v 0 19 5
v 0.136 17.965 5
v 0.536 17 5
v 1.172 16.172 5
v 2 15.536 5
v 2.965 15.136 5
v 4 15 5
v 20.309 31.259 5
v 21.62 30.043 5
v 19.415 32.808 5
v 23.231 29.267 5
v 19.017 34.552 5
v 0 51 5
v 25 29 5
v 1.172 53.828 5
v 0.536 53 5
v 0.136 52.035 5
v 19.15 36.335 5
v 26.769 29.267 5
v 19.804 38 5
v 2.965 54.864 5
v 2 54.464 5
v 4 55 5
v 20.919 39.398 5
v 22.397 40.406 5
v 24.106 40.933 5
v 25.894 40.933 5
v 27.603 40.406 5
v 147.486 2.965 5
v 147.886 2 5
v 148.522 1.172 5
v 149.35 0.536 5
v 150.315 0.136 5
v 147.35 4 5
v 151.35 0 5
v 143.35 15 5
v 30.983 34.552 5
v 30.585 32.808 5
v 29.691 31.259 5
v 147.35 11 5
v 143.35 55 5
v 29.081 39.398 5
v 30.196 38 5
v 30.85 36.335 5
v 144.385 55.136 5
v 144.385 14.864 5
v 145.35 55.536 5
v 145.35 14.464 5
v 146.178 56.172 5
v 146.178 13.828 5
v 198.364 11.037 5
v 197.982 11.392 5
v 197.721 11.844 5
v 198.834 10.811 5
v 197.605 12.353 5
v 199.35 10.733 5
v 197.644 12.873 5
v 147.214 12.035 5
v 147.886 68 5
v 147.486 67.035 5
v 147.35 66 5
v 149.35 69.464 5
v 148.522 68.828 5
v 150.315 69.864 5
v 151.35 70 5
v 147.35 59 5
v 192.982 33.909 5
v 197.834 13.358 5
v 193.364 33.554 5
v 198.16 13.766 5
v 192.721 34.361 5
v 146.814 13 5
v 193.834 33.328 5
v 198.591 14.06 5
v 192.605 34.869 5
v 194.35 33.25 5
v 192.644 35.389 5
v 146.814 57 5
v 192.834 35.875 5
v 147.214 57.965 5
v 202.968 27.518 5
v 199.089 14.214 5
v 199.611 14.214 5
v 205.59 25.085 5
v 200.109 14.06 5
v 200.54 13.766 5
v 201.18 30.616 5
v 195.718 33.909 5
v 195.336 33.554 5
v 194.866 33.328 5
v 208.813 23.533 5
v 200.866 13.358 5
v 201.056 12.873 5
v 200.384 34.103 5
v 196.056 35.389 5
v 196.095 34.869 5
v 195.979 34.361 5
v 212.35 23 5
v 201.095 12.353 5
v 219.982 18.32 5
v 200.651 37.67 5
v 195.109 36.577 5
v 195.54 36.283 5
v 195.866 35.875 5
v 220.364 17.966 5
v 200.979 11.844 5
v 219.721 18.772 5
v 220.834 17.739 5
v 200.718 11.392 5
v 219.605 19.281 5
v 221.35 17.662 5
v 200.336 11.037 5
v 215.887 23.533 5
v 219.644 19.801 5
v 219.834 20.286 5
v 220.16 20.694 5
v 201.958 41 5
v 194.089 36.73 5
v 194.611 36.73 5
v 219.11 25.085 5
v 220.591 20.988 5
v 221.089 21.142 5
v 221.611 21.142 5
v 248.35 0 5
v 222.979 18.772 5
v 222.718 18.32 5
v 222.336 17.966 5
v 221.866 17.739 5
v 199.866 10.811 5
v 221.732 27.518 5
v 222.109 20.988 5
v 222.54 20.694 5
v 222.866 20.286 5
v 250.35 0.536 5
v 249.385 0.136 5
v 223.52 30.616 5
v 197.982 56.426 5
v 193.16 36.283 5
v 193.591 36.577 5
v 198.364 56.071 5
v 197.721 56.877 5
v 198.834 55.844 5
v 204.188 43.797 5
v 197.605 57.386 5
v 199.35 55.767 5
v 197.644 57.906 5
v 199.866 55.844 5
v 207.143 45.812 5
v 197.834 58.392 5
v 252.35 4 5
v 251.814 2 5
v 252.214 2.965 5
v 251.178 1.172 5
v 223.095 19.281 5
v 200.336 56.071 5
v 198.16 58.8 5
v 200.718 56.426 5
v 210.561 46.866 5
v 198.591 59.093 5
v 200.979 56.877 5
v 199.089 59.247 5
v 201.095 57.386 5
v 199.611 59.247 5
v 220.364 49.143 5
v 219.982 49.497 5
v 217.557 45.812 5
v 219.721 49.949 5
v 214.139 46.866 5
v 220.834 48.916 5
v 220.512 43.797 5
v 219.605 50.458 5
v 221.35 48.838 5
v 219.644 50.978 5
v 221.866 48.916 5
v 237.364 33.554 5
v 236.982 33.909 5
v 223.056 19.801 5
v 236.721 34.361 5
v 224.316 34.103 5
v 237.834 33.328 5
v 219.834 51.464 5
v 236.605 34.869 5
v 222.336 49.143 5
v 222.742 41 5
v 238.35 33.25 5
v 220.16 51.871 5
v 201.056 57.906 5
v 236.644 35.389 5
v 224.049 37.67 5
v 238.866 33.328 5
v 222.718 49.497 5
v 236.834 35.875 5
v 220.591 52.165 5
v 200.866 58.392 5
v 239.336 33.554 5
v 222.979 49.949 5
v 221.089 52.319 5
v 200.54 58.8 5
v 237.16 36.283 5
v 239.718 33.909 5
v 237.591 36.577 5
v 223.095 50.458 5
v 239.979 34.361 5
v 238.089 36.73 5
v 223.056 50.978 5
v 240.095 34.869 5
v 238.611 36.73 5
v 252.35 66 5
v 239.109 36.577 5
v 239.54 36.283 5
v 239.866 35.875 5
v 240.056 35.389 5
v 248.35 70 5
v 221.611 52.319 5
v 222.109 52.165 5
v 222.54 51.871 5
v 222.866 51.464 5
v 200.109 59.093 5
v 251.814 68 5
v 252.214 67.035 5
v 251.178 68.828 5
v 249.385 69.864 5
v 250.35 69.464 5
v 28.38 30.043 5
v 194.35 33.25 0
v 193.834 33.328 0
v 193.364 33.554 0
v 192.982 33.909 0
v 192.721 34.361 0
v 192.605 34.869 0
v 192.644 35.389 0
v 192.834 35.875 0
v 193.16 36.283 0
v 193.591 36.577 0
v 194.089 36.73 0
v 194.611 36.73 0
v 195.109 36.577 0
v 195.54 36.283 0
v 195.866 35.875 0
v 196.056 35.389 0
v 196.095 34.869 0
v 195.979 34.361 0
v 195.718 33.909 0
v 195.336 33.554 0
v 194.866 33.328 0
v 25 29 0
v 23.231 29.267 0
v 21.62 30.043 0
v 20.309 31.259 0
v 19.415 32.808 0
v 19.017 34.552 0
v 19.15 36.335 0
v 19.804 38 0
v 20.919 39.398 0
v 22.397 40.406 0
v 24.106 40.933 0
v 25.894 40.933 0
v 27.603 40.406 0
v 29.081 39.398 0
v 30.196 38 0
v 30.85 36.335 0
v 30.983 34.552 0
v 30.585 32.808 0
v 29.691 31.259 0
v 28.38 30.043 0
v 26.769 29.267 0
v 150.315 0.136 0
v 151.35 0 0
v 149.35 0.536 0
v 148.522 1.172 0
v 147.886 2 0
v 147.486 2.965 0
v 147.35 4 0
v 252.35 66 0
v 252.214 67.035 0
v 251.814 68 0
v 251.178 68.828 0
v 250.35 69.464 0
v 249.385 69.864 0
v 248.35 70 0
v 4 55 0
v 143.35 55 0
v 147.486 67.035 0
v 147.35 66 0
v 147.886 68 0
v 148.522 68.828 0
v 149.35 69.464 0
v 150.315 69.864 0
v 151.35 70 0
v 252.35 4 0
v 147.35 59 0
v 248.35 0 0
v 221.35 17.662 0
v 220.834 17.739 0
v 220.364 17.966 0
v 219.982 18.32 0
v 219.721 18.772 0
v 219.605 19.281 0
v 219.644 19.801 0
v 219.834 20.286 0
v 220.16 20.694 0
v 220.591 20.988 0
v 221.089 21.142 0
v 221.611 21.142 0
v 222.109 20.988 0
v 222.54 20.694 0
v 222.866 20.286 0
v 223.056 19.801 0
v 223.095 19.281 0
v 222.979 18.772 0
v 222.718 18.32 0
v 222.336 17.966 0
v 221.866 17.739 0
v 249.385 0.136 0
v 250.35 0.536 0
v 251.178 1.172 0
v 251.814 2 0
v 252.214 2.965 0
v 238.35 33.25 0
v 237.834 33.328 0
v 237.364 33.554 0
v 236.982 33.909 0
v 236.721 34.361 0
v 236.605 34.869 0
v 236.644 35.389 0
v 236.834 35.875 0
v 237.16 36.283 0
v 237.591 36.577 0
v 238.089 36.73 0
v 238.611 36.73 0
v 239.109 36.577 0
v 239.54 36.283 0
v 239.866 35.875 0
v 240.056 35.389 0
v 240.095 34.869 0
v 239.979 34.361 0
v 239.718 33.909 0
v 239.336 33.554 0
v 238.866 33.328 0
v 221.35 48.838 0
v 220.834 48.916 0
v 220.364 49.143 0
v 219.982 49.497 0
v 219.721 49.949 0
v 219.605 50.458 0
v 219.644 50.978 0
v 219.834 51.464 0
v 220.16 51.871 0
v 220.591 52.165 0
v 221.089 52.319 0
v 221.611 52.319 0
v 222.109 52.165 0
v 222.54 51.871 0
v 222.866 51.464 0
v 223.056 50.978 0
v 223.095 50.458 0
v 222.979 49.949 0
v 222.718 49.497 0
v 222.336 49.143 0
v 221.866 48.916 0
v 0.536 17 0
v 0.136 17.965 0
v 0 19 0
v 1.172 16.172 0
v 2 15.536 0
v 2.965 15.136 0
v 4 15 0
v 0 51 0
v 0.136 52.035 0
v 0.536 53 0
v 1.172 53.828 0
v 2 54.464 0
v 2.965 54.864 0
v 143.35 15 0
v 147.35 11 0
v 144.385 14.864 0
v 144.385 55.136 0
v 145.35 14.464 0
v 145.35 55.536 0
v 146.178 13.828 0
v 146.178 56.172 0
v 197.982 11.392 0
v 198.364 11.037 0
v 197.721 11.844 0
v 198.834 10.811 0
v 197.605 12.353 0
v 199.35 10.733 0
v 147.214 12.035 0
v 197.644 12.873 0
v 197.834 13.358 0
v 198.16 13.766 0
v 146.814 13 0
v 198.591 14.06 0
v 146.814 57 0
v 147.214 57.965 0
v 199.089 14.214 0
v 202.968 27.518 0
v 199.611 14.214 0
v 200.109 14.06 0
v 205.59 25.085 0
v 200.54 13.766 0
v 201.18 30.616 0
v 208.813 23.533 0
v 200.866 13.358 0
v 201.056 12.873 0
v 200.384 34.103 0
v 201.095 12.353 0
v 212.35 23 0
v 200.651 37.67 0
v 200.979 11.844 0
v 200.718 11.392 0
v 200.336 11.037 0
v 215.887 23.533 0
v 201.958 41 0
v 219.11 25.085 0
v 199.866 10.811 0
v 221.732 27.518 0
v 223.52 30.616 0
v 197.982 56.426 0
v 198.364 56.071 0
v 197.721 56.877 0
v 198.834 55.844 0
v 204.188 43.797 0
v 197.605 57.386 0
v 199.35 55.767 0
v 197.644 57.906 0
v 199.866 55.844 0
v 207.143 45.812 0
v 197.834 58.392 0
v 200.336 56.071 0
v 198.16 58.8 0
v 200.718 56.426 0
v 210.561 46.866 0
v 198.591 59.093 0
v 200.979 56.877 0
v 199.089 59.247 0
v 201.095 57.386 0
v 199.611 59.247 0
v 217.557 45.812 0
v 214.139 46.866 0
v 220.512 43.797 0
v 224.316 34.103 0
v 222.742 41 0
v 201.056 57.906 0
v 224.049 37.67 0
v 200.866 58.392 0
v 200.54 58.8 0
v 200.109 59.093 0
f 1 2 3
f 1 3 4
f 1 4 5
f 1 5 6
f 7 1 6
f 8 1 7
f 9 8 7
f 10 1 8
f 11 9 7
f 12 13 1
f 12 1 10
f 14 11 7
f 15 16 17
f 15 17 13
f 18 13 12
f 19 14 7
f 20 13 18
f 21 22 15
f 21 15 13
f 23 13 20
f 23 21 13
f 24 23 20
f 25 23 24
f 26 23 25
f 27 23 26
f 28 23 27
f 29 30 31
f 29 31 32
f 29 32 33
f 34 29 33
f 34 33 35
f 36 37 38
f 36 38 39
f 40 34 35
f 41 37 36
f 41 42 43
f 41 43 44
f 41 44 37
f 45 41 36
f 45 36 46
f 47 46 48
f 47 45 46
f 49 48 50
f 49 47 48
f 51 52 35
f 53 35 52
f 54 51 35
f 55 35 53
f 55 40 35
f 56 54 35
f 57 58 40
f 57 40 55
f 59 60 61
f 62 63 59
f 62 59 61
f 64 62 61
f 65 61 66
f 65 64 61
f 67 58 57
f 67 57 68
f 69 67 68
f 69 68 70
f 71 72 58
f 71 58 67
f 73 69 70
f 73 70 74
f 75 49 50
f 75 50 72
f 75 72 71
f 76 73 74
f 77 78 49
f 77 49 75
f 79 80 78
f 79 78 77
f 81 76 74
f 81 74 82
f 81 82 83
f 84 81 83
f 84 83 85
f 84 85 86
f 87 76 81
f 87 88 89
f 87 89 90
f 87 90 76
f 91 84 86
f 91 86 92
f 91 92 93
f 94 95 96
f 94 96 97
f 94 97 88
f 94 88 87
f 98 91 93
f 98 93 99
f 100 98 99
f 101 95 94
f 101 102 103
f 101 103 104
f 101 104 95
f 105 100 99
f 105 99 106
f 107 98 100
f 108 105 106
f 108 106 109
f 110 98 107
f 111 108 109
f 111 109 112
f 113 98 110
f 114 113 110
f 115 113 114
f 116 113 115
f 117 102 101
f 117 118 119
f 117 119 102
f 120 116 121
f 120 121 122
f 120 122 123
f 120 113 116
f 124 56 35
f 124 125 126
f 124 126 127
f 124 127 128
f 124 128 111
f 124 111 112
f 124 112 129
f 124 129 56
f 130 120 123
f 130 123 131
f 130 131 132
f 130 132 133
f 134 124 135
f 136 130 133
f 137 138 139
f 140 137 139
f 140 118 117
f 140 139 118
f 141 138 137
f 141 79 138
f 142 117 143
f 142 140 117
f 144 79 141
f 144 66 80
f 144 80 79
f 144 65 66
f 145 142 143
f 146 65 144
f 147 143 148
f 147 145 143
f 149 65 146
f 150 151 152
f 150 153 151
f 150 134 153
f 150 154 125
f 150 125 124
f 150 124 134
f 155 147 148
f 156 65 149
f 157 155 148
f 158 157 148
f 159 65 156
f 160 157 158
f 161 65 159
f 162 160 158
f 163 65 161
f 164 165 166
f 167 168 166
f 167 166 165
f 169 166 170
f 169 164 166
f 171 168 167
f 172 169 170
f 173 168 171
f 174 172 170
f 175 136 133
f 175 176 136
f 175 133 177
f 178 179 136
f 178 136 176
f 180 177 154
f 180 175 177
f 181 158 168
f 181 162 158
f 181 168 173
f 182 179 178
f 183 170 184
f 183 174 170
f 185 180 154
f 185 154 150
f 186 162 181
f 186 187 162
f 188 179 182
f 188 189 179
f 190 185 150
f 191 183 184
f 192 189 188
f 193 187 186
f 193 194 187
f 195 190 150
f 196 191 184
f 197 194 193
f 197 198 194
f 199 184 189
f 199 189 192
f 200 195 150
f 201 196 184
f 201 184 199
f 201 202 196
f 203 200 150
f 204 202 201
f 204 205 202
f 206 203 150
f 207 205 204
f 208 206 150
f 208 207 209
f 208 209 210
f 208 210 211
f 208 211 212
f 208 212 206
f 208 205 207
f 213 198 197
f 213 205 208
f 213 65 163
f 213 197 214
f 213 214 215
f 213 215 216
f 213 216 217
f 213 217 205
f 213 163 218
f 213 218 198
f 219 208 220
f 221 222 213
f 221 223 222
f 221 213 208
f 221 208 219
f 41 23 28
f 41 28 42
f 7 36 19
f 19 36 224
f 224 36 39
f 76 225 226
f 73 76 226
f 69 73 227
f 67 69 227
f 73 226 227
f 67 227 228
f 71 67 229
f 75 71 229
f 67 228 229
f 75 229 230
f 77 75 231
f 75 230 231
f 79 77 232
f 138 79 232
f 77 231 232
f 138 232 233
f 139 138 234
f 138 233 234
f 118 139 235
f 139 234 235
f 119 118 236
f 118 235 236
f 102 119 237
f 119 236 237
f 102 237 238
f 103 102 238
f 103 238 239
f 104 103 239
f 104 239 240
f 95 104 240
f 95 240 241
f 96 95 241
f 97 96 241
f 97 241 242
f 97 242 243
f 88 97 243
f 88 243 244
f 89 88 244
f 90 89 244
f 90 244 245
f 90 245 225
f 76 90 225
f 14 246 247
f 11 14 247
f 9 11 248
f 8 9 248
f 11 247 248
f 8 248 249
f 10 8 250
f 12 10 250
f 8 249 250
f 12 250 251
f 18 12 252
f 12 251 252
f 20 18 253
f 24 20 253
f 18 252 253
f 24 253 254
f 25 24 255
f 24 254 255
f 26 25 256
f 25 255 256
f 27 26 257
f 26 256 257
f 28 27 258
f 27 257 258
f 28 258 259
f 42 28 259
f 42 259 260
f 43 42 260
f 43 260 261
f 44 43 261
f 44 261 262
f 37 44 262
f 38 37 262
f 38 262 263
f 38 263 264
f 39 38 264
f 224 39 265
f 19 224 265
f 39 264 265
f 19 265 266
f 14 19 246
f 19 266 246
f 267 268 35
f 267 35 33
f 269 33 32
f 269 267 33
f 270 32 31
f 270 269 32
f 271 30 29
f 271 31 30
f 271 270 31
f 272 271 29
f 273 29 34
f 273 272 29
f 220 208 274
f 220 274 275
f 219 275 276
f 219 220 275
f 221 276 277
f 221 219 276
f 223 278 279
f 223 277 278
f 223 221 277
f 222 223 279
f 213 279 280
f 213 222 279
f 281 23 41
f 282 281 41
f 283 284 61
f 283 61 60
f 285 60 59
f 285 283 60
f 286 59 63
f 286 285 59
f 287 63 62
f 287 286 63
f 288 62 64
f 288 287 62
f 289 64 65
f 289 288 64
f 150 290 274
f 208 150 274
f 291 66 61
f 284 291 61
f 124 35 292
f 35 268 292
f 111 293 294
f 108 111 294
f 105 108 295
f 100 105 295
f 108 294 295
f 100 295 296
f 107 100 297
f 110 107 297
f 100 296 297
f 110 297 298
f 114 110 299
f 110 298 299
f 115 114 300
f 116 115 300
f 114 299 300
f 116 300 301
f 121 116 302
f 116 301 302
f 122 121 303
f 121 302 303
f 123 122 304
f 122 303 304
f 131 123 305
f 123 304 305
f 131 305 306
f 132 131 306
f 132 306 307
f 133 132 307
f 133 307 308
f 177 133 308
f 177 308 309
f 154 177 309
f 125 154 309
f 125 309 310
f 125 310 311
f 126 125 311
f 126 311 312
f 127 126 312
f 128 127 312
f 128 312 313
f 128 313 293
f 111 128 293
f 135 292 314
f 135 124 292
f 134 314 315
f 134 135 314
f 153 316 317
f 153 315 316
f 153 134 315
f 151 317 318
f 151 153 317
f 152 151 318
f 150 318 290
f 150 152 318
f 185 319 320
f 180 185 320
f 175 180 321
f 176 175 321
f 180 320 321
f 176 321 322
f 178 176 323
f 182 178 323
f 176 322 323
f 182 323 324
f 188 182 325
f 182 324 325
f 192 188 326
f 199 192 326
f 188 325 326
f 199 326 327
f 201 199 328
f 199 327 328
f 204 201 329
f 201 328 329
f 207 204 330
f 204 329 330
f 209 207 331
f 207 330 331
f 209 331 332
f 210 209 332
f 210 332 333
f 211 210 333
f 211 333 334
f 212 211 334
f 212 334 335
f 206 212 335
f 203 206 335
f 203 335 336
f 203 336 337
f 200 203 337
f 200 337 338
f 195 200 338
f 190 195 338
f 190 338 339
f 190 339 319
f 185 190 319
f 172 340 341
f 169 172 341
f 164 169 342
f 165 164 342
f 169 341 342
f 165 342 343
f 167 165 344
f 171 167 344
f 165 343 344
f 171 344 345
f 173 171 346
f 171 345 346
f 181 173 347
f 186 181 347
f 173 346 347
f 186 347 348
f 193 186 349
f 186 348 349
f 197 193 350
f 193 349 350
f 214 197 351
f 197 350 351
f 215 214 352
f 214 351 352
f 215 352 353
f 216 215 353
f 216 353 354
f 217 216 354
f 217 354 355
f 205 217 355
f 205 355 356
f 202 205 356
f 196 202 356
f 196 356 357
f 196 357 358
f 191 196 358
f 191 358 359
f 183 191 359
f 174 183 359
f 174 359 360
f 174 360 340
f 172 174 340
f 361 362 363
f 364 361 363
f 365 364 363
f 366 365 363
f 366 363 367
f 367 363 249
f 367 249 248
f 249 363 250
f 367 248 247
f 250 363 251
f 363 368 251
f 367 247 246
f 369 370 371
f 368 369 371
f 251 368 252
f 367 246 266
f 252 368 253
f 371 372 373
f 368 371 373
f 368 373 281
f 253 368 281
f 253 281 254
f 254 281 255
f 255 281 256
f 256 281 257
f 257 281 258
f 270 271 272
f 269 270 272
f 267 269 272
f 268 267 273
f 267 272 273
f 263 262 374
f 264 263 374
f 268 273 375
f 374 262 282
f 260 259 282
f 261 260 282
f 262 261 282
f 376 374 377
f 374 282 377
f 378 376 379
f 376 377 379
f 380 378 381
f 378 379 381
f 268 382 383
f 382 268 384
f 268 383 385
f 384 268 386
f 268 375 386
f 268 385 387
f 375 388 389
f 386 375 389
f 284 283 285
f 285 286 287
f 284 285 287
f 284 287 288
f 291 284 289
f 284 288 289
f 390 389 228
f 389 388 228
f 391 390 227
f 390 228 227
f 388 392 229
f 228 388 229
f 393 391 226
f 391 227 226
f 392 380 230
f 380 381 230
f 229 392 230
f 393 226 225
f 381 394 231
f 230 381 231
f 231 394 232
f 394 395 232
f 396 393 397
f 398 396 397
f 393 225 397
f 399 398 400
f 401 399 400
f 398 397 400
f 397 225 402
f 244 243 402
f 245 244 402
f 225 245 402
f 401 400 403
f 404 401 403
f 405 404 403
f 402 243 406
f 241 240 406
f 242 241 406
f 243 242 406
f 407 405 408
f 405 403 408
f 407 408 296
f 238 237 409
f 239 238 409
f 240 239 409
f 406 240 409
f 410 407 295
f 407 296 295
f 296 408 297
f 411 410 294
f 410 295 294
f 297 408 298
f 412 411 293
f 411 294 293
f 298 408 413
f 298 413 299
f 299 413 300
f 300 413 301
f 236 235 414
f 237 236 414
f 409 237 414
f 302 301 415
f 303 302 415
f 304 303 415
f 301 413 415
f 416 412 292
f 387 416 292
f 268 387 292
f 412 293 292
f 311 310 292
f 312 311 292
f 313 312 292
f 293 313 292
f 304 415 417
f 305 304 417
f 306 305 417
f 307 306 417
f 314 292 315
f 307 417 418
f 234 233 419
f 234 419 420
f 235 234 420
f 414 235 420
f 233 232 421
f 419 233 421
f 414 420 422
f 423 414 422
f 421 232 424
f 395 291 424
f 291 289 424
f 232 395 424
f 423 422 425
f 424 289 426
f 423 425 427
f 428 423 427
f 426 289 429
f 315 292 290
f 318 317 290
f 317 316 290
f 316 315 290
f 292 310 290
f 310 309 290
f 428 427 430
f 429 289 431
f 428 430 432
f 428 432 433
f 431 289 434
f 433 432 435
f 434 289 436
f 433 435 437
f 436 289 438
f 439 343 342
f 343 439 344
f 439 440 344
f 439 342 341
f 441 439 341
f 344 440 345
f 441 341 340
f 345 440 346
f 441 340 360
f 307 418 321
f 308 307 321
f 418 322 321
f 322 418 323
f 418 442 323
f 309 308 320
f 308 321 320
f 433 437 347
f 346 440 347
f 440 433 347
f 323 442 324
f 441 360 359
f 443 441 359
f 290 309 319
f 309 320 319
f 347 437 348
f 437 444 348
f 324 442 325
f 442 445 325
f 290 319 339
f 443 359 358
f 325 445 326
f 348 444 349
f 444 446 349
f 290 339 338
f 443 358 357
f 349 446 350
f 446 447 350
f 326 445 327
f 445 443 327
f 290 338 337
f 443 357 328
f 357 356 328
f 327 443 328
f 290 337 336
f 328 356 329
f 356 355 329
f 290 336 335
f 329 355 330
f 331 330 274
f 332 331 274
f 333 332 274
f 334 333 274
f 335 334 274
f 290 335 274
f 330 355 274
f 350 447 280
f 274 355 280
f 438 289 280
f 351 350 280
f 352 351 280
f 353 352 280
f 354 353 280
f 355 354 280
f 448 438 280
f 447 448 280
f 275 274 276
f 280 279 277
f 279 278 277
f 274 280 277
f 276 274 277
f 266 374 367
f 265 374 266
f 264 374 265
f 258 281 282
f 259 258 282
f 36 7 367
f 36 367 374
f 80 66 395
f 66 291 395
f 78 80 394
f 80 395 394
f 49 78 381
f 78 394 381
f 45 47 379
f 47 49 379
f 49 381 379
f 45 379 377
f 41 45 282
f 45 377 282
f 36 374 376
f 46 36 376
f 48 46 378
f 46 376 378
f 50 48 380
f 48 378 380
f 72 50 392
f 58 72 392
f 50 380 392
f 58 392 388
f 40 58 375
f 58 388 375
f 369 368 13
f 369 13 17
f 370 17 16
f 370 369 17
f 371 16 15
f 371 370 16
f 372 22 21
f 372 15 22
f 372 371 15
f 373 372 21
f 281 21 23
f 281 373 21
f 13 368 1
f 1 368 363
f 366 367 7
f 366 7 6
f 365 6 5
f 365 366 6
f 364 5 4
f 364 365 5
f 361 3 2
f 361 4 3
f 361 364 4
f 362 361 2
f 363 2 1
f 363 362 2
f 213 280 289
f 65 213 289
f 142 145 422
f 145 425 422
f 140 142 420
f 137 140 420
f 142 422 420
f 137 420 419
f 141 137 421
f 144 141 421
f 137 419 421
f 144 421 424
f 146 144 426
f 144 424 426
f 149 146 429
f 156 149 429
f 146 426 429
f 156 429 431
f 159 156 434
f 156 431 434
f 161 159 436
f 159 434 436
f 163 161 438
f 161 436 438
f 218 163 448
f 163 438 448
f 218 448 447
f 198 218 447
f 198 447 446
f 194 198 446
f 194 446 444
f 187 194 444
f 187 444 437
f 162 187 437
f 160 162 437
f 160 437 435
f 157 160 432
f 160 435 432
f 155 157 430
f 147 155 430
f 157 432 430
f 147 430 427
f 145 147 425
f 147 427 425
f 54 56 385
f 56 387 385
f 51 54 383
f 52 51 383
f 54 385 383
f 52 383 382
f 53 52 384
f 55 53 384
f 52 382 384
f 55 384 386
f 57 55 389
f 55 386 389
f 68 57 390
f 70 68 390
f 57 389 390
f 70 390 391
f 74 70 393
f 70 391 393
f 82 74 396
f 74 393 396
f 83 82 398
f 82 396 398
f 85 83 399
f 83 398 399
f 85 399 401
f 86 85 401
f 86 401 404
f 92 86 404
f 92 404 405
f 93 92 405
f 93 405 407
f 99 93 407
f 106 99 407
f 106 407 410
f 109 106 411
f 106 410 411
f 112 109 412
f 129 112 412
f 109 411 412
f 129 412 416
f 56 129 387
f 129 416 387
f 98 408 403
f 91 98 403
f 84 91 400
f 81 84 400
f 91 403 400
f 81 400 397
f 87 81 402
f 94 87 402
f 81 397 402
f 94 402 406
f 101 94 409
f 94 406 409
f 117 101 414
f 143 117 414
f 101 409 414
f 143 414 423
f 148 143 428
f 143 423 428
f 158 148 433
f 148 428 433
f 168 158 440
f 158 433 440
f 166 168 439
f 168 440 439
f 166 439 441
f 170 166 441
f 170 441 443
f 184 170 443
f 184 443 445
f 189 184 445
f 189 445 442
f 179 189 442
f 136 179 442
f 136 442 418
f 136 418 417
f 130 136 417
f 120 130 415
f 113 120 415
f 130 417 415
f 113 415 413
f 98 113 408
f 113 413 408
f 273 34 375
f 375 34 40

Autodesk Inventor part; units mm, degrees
ref_plane "YZ Plane" through (0, 0, 0) normal (1, 0, 0) x (0, 1, 0)
ref_plane "XZ Plane" through (0, 0, 0) normal (0, 1, 0) x (-1, 0, 0)
ref_plane "XY Plane" through (0, 0, 0) normal (0, 0, 1) x (1, 0, 0)
sketch "スケッチ1" plane through (0, 0, 0) normal (0, 0, 1) x (1, 0, 0)
  line L0 (0, 0) -> (252.35, 0)
  line L1 (252.35, 0) -> (252.35, 70)
  line L2 (252.35, 70) -> (0, 70)
  line L3 (0, 70) -> (0, 0)
  dimension "d0" = 70
  dimension "d1" = 252.35
extrude "押し出し1" add sketch "スケッチ1" along normal blind 5
sketch "スケッチ2" plane through (0, 0, 5) normal (0, 0, 1) x (1, 0, 0)
  line L0 (0, 0) -> (252.35, 0) projected
  line L1 (0, 70) -> (0, 0) projected
  point P0 (25, 35)
  dimension "d4" = 35
  dimension "d5" = 25
hole "穴1" at (25, 35, 5) direction (0, 0, -1) diameter 12 end through all
sketch "スケッチ3" plane through (0, 0, 5) normal (0, 0, 1) x (1, 0, 0)
  line L0 (252.35, 0) -> (252.35, 70) projected
  circle A0 centre (25, 35) radius 6 projected
  line L1 (0, 0) -> (252.35, 0) projected
  point P0 (212.35, 35)
  dimension "d14" = 187.35
  dimension "d15" = 35
hole "穴2" at (212.35, 35, 5) direction (0, 0, -1) diameter 24 end through all
sketch "スケッチ4" plane through (0, 0, 5) normal (0, 0, 1) x (1, 0, 0)
  line L0 (252.35, 0) -> (252.35, 70) projected
  line L1 (0, 70) -> (0, 0) projected
  line L2 (252.35, 70) -> (0, 70) projected
  line L3 (0, 0) -> (252.35, 0) projected
  line L4 (0, 55) -> (147.35, 55)
  line L5 (0, 15) -> (147.35, 15)
  line L6 (147.35, 0) -> (147.35, 15)
  line L7 (147.35, 55) -> (147.35, 70)
  line L8 (147.35, 55) -> (0, 55)
  line L9 (0, 55) -> (0, 70)
  line L10 (0, 70) -> (147.35, 70)
  line L11 (147.35, 70) -> (147.35, 55)
  line L12 (147.35, 15) -> (0, 15)
  line L13 (0, 15) -> (0, 0)
  line L14 (0, 0) -> (147.35, 0)
  line L15 (147.35, 0) -> (147.35, 15)
  dimension "d24" = 15
  dimension "d25" = 15
extrude "押し出し2" cut sketch "スケッチ4" against normal blind 10 contours L3 L1 L5 L6 | L7 L4 L1 L2
fillet "フィレット1" radius 4 2 edges at (147.35, 15, 2.5) (147.35, 55, 2.5)
sketch "スケッチ5" plane through (0, 0, 5) normal (0, 0, 1) x (1, 0, 0)
  line L0 (147.35, 0) -> (252.35, 0) projected
  circle A0 centre (212.35, 35) radius 12 projected
  point P0 (0, 0)
  point P1 (238.35, 35)
  point P2 (199.35, 57.5167)
  point P3 (199.35, 12.4833)
  dimension "d29" = 35
  dimension "d30" = 26
  dimension "d33" = 360
hole "穴3" at (238.35, 35, 5) at (199.35, 57.5167, 5) at (199.35, 12.4833, 5) direction (0, 0, -1) diameter 3.5 end through all
sketch "スケッチ6" plane through (0, 0, 5) normal (0, 0, 1) x (1, 0, 0)
  circle A0 centre (212.35, 35) radius 12 projected
  line L0 (147.35, 0) -> (252.35, 0) projected
  point P0 (0, 0)
  point P1 (194.35, 35)
  point P2 (221.35, 19.4115)
  point P3 (221.35, 50.5885)
  dimension "d42" = 18
  dimension "d43" = 35
  dimension "d46" = 360
hole "穴4" at (194.35, 35, 5) at (221.35, 19.4115, 5) at (221.35, 50.5885, 5) direction (0, 0, -1) diameter 3.5 end through all
fillet "フィレット2" radius 4 6 edges at (0, 55, 2.5) (0, 15, 2.5) (147.35, 0, 2.5) (147.35, 70, 2.5) (252.35, 70, 2.5) (252.35, 0, 2.5)
sketch "スケッチ7" plane through (0, 0, 0) normal (0, 0, -1) x (-1, 0, 0)
  point P0 (0, 0)
properties part number "タイヤアーム"
